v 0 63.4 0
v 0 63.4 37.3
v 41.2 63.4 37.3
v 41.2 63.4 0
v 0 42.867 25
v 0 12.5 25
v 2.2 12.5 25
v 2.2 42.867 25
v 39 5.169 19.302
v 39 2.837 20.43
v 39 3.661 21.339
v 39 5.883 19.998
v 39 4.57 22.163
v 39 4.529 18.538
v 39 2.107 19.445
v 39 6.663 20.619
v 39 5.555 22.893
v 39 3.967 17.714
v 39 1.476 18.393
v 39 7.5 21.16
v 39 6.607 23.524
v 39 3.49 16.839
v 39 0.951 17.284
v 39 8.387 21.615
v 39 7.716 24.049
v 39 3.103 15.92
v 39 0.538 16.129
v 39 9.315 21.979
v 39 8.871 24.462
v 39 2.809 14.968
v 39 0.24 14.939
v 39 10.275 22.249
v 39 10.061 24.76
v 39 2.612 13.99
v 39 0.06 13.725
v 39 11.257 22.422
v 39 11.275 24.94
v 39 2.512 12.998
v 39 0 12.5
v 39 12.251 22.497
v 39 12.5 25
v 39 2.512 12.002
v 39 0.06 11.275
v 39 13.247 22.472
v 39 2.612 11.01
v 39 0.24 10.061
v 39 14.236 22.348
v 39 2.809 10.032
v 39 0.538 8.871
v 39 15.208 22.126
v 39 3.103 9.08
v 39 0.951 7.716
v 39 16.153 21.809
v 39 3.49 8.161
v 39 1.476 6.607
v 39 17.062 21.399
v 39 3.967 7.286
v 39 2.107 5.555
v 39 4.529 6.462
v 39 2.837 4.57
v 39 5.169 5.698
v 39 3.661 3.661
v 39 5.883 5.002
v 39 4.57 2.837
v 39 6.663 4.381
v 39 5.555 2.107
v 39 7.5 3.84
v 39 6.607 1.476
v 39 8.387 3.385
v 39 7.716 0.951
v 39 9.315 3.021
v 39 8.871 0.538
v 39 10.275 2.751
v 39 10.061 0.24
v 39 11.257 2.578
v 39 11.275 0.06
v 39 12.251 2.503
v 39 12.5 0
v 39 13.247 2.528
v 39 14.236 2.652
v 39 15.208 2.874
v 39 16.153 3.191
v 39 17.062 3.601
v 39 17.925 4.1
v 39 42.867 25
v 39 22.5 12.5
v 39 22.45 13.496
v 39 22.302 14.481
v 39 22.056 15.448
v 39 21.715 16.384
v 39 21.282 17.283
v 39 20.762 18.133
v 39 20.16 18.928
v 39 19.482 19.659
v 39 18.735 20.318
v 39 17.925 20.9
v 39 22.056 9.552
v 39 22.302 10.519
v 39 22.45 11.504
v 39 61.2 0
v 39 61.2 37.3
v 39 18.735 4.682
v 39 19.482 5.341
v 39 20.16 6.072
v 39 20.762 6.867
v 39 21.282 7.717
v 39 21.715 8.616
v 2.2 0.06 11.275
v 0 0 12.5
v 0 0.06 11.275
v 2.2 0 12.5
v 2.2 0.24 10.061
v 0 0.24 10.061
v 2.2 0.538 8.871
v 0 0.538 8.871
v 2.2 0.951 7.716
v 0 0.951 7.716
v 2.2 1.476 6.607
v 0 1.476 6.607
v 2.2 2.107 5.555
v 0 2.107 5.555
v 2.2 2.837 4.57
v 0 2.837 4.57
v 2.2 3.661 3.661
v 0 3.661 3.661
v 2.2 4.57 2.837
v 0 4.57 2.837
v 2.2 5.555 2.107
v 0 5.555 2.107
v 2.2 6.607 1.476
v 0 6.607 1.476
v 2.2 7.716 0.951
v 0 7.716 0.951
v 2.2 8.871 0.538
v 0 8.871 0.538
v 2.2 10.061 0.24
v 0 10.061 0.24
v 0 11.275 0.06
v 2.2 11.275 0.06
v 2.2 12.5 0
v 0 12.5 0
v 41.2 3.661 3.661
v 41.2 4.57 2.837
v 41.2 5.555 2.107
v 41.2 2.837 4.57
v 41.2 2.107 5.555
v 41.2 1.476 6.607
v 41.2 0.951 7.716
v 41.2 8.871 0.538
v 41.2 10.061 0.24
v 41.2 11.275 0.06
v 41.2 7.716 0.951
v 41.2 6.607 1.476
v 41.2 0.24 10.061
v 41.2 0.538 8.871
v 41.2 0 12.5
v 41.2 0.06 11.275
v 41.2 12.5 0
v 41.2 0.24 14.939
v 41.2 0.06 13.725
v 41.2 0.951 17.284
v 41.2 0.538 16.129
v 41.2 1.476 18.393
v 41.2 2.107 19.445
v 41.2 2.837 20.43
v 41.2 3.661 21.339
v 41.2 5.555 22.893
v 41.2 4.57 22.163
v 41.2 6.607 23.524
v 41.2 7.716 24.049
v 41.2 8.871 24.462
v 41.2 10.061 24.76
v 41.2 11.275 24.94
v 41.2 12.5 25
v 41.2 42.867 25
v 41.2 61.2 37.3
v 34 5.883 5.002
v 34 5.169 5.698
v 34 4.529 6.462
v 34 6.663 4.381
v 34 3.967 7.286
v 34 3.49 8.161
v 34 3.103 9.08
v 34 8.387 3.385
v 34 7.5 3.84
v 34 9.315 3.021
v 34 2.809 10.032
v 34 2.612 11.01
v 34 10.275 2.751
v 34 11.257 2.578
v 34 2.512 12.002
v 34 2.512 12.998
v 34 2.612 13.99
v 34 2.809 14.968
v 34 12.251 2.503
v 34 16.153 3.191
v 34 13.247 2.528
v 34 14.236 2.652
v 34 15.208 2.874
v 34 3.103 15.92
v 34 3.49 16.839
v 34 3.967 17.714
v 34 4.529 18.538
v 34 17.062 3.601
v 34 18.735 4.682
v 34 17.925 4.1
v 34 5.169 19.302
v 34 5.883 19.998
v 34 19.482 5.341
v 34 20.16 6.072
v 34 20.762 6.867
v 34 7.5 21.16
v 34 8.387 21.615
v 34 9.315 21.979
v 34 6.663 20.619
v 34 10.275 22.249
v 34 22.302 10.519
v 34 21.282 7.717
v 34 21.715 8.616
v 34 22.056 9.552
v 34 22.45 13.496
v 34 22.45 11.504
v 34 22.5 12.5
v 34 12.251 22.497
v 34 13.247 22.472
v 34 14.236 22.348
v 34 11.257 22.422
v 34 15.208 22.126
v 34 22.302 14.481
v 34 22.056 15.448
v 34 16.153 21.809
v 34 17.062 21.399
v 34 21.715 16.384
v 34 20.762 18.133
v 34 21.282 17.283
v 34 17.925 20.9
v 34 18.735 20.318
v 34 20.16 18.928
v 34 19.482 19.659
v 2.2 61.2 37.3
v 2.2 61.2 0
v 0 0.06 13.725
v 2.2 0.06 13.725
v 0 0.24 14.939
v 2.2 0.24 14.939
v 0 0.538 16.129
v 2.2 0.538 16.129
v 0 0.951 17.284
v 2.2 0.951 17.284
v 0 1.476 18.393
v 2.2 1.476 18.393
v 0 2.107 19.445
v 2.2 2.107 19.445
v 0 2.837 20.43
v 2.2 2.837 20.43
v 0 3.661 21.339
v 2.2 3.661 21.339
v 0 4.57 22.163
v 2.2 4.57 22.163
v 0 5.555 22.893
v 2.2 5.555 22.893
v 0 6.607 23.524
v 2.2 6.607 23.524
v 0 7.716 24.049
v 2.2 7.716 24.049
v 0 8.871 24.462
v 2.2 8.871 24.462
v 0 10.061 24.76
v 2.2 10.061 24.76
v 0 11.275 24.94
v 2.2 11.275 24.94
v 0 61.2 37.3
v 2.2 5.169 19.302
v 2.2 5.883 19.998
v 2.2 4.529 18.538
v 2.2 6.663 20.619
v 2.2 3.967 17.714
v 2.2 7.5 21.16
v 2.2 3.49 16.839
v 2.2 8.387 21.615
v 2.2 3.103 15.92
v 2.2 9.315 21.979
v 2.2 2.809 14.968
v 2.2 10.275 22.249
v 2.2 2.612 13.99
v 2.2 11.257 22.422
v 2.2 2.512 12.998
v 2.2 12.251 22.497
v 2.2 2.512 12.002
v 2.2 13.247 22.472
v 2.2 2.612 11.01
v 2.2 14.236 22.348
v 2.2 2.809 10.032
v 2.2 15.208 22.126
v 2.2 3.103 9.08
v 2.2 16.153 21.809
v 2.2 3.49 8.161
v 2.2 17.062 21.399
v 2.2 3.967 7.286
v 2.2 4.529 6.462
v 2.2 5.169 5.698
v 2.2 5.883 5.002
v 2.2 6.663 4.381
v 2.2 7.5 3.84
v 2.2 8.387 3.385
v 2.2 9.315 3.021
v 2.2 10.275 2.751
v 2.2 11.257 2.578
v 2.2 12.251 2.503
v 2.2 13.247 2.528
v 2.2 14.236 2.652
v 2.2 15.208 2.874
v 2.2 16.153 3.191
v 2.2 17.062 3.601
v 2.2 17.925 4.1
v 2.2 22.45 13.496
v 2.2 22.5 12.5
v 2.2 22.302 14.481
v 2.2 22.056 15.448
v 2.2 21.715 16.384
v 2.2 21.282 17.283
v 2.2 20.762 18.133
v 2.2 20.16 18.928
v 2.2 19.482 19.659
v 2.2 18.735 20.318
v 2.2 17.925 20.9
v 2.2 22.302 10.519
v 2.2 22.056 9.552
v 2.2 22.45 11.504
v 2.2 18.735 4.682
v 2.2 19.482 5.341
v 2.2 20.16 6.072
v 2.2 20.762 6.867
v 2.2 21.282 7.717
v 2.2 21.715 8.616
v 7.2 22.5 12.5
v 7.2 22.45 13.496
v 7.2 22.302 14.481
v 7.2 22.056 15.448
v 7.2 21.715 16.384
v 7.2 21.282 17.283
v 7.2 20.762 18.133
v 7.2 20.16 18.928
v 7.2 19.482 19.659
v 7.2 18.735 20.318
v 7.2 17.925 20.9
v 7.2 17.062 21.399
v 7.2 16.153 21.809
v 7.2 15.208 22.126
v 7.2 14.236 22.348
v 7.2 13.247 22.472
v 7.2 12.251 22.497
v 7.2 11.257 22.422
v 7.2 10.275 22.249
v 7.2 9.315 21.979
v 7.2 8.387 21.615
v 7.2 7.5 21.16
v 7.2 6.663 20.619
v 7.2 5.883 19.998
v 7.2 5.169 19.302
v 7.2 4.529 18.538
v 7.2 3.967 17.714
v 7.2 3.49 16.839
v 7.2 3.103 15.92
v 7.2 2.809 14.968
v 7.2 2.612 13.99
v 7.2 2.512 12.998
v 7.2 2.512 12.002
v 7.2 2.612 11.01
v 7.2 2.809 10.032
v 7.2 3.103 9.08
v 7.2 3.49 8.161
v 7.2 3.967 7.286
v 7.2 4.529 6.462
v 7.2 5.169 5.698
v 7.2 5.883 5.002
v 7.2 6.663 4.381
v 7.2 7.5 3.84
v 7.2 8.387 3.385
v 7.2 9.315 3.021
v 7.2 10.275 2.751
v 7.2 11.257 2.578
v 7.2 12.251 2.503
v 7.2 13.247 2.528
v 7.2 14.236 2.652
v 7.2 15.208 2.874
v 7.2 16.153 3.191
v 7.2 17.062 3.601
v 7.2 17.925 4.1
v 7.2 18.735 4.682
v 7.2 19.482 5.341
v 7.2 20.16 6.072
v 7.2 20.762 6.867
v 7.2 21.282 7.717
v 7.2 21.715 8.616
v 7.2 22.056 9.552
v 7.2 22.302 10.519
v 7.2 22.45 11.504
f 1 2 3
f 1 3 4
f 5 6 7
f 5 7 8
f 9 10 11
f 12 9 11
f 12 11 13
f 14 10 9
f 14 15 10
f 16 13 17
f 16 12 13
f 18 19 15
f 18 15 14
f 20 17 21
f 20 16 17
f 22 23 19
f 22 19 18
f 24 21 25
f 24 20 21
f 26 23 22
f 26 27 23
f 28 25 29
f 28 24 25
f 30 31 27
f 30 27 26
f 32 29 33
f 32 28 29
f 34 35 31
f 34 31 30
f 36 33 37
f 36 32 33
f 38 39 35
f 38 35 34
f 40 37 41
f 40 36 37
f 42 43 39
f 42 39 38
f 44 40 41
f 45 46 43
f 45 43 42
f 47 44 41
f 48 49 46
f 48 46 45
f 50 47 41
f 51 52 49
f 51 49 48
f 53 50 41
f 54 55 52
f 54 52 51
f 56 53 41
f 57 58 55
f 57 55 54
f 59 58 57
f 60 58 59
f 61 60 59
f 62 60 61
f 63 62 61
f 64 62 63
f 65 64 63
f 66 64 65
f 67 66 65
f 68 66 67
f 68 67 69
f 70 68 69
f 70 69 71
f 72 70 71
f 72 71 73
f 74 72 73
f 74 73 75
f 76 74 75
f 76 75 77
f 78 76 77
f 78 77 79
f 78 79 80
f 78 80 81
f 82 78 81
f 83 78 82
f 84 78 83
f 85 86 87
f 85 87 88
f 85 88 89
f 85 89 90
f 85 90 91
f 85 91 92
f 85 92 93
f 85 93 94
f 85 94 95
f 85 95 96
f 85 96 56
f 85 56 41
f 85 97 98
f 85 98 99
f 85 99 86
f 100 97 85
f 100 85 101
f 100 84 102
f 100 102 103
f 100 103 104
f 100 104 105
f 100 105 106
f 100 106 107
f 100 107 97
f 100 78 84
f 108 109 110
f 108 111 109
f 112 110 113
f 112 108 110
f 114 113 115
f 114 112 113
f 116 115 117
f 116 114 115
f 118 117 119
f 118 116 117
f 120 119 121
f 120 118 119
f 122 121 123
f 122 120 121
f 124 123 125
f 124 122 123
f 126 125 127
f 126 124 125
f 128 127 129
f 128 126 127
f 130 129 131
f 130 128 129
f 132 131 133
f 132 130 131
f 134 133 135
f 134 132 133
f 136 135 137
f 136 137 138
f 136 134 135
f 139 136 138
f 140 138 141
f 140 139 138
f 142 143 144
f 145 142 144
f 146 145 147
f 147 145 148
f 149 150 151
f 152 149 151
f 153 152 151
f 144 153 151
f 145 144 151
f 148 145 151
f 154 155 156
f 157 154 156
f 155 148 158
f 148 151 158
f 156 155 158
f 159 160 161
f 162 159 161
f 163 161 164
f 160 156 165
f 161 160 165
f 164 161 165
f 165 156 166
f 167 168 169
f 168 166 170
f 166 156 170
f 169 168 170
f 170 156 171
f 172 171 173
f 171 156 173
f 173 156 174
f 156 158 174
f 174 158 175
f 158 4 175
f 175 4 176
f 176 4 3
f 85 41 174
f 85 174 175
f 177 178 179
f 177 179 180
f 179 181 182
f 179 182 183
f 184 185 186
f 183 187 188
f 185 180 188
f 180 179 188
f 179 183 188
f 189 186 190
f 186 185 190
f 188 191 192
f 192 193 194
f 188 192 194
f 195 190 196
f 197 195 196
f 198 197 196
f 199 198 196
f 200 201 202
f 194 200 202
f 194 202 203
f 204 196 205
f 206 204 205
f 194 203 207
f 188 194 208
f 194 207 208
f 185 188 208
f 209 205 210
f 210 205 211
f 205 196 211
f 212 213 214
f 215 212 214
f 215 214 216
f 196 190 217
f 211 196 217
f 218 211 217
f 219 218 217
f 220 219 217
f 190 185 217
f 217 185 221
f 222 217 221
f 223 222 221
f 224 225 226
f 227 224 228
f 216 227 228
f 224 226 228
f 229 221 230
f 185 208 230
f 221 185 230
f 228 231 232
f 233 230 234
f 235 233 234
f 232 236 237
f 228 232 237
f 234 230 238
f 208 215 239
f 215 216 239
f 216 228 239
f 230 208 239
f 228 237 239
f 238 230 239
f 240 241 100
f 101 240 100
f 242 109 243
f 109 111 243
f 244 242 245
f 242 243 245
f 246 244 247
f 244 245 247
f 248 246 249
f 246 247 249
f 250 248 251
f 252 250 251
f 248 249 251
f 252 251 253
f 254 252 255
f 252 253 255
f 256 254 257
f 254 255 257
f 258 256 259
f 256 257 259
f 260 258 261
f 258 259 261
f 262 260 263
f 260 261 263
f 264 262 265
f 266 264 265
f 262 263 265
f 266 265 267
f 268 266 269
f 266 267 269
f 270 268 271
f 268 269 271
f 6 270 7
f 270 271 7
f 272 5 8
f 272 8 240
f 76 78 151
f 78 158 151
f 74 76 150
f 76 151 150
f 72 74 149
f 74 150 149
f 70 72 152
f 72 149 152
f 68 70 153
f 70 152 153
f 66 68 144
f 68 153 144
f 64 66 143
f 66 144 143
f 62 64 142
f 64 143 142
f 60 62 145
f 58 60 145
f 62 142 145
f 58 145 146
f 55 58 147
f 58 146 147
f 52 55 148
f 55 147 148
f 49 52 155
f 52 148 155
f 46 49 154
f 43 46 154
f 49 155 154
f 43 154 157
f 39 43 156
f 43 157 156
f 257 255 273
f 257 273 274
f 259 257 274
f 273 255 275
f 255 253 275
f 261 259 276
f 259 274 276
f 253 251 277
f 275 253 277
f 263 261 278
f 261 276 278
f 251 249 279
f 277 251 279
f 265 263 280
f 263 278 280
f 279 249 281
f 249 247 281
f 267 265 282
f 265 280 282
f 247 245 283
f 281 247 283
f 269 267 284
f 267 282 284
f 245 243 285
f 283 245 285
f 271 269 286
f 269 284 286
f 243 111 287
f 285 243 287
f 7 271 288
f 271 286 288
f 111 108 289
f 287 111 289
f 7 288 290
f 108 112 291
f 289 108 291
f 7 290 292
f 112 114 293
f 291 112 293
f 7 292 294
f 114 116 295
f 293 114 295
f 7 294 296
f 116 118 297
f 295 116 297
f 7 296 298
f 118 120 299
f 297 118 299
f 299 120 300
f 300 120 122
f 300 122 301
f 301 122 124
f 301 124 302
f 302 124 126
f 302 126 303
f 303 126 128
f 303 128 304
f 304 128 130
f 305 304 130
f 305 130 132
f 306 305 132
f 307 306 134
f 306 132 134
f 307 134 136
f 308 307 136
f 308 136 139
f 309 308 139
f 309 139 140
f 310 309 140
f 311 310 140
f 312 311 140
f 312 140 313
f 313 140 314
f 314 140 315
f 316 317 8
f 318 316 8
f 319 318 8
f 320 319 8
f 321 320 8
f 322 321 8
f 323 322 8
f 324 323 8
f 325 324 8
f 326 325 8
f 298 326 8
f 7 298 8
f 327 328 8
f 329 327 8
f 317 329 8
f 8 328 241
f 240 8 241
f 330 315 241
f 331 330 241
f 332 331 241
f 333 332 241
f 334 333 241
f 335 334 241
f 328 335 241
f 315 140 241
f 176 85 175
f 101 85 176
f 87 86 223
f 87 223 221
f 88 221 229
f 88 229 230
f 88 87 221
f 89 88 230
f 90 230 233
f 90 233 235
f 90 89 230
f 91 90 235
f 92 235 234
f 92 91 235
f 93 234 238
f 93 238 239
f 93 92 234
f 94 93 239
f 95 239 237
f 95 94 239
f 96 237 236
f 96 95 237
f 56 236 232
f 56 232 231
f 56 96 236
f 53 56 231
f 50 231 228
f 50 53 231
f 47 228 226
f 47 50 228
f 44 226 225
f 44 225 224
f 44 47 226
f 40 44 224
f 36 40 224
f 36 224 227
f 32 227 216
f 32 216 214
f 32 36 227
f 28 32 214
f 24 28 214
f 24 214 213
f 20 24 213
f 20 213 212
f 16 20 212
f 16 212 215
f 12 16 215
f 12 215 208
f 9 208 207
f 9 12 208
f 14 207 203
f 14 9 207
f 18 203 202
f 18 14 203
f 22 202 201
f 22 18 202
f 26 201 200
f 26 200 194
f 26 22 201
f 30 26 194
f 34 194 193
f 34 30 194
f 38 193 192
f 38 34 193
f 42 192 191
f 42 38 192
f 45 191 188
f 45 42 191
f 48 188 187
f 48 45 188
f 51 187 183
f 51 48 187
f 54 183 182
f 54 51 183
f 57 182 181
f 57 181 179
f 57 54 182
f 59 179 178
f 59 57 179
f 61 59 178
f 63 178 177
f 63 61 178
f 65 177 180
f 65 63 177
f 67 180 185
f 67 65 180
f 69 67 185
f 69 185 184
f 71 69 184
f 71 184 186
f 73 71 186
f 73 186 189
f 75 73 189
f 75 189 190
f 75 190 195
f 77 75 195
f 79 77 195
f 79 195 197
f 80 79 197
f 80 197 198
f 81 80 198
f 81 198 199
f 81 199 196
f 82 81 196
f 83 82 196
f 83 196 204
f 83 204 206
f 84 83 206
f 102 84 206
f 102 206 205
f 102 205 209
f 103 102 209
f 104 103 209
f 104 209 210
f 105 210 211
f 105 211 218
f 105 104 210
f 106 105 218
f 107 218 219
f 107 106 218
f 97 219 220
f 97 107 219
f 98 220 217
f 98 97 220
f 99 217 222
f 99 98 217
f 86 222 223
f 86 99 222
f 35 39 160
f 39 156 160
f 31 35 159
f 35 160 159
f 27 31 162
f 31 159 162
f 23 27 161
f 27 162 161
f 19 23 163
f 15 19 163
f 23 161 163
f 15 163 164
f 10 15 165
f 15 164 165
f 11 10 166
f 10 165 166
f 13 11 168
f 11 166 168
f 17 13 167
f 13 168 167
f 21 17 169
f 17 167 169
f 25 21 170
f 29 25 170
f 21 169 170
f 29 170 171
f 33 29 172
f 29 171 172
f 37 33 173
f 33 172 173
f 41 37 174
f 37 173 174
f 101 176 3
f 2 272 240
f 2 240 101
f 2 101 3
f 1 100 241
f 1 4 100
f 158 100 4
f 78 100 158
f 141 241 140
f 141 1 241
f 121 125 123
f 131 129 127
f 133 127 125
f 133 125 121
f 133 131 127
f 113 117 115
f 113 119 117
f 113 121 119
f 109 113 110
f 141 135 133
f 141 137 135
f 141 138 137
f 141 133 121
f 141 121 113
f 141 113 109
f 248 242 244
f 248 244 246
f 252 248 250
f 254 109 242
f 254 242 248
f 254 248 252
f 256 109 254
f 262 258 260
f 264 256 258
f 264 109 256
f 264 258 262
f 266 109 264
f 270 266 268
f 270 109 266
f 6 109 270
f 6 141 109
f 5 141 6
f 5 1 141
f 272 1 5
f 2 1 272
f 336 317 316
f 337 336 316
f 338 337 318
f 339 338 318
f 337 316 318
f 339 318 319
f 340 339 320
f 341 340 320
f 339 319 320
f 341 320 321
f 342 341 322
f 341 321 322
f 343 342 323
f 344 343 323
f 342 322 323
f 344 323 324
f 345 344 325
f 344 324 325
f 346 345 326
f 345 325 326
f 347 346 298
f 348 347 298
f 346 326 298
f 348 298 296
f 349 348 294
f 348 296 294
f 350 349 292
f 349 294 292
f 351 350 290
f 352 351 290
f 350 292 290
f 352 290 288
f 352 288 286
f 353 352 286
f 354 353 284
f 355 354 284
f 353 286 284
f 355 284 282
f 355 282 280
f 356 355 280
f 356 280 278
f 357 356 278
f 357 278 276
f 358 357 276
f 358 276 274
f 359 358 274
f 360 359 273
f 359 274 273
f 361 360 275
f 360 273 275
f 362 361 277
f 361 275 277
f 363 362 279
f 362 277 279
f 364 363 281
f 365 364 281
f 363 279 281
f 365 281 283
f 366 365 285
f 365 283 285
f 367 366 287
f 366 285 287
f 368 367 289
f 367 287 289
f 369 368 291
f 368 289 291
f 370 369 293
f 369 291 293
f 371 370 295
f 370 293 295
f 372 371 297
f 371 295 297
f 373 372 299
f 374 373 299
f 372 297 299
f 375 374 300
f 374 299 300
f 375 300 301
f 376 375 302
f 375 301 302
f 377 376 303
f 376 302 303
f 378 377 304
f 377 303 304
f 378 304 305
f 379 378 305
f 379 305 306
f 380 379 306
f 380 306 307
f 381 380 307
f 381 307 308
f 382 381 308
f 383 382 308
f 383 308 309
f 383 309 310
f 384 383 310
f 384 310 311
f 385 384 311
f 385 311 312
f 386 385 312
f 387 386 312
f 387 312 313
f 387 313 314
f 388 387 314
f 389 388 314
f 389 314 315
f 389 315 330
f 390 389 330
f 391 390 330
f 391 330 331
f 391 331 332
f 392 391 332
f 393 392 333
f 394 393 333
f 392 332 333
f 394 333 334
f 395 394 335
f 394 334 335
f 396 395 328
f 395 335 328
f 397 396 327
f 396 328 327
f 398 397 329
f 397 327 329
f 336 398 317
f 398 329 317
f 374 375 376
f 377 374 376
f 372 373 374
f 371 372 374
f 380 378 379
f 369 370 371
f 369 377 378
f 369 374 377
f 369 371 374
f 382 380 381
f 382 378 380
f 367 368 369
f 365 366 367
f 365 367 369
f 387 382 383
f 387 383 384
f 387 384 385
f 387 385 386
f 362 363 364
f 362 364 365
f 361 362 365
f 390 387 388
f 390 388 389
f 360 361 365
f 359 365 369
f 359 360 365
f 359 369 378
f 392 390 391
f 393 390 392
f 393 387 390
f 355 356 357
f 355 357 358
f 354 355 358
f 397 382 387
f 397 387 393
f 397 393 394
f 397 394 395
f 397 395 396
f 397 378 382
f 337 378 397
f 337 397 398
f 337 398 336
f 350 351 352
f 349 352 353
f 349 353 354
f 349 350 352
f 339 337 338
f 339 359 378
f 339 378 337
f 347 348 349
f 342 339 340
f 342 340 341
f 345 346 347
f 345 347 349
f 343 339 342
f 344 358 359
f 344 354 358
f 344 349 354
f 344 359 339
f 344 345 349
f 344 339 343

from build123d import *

# Parameters (mm, degrees)
BOSS_EXTRUDE1_DEPTH = 41.2
SKETCH4_W           = 36.8
SKETCH4_H           = 61.2
CUT_EXTRUDE1_DEPTH  = 10000
SKETCH5_R           = 10
BOSS_EXTRUDE2_DEPTH = 5
FILLET1_R           = 12.5


with BuildPart() as part:
    # Sketch2 → Boss-Extrude1 (new body)
    with BuildSketch(Plane(origin=(0, 0, 0), x_dir=(0, 0, -1), z_dir=(1, 0, 0))):
        Polygon((0, 0), (-25, 0), (-25, 42.867109497), (-37.3, 61.2), (-37.3, 63.4), (0, 63.4), align=None)
    extrude(amount=BOSS_EXTRUDE1_DEPTH)

    # Sketch4 → Cut-Extrude1 (cut)
    with BuildSketch(Plane.XY):
        with Locations((20.6, 30.6)):
            Rectangle(SKETCH4_W, SKETCH4_H)
    extrude(amount=CUT_EXTRUDE1_DEPTH, mode=Mode.SUBTRACT)

    # Sketch5 → Boss-Extrude2 (add)
    with BuildSketch(Plane(origin=(2.2, 0, 0), x_dir=(0, 0, -1), z_dir=(1, 0, 0))):
        with Locations(Location((-12.5, 12.5, 0), (0, 0, 90))):
            Circle(SKETCH5_R)
    boss_extrude2 = extrude(amount=BOSS_EXTRUDE2_DEPTH)

    # Mirror1: Boss-Extrude2 across plane
    add(boss_extrude2.mirror(Plane(origin=(20.6, 0, 0), x_dir=(0, 0, 1), z_dir=(1, 0, 0))))

    # Fillet1
    fillet1_edges = [part.edges().sort_by_distance(p)[0] for p in [
        (1.1, 0, 25),
        (1.1, 0, 0),
        (40.1, 0, 0),
        (40.1, 0, 25),
    ]]
    fillet(fillet1_edges, radius=FILLET1_R - 0.0001)  # a hair under: the kernel refuses the full size


solid = part.part
